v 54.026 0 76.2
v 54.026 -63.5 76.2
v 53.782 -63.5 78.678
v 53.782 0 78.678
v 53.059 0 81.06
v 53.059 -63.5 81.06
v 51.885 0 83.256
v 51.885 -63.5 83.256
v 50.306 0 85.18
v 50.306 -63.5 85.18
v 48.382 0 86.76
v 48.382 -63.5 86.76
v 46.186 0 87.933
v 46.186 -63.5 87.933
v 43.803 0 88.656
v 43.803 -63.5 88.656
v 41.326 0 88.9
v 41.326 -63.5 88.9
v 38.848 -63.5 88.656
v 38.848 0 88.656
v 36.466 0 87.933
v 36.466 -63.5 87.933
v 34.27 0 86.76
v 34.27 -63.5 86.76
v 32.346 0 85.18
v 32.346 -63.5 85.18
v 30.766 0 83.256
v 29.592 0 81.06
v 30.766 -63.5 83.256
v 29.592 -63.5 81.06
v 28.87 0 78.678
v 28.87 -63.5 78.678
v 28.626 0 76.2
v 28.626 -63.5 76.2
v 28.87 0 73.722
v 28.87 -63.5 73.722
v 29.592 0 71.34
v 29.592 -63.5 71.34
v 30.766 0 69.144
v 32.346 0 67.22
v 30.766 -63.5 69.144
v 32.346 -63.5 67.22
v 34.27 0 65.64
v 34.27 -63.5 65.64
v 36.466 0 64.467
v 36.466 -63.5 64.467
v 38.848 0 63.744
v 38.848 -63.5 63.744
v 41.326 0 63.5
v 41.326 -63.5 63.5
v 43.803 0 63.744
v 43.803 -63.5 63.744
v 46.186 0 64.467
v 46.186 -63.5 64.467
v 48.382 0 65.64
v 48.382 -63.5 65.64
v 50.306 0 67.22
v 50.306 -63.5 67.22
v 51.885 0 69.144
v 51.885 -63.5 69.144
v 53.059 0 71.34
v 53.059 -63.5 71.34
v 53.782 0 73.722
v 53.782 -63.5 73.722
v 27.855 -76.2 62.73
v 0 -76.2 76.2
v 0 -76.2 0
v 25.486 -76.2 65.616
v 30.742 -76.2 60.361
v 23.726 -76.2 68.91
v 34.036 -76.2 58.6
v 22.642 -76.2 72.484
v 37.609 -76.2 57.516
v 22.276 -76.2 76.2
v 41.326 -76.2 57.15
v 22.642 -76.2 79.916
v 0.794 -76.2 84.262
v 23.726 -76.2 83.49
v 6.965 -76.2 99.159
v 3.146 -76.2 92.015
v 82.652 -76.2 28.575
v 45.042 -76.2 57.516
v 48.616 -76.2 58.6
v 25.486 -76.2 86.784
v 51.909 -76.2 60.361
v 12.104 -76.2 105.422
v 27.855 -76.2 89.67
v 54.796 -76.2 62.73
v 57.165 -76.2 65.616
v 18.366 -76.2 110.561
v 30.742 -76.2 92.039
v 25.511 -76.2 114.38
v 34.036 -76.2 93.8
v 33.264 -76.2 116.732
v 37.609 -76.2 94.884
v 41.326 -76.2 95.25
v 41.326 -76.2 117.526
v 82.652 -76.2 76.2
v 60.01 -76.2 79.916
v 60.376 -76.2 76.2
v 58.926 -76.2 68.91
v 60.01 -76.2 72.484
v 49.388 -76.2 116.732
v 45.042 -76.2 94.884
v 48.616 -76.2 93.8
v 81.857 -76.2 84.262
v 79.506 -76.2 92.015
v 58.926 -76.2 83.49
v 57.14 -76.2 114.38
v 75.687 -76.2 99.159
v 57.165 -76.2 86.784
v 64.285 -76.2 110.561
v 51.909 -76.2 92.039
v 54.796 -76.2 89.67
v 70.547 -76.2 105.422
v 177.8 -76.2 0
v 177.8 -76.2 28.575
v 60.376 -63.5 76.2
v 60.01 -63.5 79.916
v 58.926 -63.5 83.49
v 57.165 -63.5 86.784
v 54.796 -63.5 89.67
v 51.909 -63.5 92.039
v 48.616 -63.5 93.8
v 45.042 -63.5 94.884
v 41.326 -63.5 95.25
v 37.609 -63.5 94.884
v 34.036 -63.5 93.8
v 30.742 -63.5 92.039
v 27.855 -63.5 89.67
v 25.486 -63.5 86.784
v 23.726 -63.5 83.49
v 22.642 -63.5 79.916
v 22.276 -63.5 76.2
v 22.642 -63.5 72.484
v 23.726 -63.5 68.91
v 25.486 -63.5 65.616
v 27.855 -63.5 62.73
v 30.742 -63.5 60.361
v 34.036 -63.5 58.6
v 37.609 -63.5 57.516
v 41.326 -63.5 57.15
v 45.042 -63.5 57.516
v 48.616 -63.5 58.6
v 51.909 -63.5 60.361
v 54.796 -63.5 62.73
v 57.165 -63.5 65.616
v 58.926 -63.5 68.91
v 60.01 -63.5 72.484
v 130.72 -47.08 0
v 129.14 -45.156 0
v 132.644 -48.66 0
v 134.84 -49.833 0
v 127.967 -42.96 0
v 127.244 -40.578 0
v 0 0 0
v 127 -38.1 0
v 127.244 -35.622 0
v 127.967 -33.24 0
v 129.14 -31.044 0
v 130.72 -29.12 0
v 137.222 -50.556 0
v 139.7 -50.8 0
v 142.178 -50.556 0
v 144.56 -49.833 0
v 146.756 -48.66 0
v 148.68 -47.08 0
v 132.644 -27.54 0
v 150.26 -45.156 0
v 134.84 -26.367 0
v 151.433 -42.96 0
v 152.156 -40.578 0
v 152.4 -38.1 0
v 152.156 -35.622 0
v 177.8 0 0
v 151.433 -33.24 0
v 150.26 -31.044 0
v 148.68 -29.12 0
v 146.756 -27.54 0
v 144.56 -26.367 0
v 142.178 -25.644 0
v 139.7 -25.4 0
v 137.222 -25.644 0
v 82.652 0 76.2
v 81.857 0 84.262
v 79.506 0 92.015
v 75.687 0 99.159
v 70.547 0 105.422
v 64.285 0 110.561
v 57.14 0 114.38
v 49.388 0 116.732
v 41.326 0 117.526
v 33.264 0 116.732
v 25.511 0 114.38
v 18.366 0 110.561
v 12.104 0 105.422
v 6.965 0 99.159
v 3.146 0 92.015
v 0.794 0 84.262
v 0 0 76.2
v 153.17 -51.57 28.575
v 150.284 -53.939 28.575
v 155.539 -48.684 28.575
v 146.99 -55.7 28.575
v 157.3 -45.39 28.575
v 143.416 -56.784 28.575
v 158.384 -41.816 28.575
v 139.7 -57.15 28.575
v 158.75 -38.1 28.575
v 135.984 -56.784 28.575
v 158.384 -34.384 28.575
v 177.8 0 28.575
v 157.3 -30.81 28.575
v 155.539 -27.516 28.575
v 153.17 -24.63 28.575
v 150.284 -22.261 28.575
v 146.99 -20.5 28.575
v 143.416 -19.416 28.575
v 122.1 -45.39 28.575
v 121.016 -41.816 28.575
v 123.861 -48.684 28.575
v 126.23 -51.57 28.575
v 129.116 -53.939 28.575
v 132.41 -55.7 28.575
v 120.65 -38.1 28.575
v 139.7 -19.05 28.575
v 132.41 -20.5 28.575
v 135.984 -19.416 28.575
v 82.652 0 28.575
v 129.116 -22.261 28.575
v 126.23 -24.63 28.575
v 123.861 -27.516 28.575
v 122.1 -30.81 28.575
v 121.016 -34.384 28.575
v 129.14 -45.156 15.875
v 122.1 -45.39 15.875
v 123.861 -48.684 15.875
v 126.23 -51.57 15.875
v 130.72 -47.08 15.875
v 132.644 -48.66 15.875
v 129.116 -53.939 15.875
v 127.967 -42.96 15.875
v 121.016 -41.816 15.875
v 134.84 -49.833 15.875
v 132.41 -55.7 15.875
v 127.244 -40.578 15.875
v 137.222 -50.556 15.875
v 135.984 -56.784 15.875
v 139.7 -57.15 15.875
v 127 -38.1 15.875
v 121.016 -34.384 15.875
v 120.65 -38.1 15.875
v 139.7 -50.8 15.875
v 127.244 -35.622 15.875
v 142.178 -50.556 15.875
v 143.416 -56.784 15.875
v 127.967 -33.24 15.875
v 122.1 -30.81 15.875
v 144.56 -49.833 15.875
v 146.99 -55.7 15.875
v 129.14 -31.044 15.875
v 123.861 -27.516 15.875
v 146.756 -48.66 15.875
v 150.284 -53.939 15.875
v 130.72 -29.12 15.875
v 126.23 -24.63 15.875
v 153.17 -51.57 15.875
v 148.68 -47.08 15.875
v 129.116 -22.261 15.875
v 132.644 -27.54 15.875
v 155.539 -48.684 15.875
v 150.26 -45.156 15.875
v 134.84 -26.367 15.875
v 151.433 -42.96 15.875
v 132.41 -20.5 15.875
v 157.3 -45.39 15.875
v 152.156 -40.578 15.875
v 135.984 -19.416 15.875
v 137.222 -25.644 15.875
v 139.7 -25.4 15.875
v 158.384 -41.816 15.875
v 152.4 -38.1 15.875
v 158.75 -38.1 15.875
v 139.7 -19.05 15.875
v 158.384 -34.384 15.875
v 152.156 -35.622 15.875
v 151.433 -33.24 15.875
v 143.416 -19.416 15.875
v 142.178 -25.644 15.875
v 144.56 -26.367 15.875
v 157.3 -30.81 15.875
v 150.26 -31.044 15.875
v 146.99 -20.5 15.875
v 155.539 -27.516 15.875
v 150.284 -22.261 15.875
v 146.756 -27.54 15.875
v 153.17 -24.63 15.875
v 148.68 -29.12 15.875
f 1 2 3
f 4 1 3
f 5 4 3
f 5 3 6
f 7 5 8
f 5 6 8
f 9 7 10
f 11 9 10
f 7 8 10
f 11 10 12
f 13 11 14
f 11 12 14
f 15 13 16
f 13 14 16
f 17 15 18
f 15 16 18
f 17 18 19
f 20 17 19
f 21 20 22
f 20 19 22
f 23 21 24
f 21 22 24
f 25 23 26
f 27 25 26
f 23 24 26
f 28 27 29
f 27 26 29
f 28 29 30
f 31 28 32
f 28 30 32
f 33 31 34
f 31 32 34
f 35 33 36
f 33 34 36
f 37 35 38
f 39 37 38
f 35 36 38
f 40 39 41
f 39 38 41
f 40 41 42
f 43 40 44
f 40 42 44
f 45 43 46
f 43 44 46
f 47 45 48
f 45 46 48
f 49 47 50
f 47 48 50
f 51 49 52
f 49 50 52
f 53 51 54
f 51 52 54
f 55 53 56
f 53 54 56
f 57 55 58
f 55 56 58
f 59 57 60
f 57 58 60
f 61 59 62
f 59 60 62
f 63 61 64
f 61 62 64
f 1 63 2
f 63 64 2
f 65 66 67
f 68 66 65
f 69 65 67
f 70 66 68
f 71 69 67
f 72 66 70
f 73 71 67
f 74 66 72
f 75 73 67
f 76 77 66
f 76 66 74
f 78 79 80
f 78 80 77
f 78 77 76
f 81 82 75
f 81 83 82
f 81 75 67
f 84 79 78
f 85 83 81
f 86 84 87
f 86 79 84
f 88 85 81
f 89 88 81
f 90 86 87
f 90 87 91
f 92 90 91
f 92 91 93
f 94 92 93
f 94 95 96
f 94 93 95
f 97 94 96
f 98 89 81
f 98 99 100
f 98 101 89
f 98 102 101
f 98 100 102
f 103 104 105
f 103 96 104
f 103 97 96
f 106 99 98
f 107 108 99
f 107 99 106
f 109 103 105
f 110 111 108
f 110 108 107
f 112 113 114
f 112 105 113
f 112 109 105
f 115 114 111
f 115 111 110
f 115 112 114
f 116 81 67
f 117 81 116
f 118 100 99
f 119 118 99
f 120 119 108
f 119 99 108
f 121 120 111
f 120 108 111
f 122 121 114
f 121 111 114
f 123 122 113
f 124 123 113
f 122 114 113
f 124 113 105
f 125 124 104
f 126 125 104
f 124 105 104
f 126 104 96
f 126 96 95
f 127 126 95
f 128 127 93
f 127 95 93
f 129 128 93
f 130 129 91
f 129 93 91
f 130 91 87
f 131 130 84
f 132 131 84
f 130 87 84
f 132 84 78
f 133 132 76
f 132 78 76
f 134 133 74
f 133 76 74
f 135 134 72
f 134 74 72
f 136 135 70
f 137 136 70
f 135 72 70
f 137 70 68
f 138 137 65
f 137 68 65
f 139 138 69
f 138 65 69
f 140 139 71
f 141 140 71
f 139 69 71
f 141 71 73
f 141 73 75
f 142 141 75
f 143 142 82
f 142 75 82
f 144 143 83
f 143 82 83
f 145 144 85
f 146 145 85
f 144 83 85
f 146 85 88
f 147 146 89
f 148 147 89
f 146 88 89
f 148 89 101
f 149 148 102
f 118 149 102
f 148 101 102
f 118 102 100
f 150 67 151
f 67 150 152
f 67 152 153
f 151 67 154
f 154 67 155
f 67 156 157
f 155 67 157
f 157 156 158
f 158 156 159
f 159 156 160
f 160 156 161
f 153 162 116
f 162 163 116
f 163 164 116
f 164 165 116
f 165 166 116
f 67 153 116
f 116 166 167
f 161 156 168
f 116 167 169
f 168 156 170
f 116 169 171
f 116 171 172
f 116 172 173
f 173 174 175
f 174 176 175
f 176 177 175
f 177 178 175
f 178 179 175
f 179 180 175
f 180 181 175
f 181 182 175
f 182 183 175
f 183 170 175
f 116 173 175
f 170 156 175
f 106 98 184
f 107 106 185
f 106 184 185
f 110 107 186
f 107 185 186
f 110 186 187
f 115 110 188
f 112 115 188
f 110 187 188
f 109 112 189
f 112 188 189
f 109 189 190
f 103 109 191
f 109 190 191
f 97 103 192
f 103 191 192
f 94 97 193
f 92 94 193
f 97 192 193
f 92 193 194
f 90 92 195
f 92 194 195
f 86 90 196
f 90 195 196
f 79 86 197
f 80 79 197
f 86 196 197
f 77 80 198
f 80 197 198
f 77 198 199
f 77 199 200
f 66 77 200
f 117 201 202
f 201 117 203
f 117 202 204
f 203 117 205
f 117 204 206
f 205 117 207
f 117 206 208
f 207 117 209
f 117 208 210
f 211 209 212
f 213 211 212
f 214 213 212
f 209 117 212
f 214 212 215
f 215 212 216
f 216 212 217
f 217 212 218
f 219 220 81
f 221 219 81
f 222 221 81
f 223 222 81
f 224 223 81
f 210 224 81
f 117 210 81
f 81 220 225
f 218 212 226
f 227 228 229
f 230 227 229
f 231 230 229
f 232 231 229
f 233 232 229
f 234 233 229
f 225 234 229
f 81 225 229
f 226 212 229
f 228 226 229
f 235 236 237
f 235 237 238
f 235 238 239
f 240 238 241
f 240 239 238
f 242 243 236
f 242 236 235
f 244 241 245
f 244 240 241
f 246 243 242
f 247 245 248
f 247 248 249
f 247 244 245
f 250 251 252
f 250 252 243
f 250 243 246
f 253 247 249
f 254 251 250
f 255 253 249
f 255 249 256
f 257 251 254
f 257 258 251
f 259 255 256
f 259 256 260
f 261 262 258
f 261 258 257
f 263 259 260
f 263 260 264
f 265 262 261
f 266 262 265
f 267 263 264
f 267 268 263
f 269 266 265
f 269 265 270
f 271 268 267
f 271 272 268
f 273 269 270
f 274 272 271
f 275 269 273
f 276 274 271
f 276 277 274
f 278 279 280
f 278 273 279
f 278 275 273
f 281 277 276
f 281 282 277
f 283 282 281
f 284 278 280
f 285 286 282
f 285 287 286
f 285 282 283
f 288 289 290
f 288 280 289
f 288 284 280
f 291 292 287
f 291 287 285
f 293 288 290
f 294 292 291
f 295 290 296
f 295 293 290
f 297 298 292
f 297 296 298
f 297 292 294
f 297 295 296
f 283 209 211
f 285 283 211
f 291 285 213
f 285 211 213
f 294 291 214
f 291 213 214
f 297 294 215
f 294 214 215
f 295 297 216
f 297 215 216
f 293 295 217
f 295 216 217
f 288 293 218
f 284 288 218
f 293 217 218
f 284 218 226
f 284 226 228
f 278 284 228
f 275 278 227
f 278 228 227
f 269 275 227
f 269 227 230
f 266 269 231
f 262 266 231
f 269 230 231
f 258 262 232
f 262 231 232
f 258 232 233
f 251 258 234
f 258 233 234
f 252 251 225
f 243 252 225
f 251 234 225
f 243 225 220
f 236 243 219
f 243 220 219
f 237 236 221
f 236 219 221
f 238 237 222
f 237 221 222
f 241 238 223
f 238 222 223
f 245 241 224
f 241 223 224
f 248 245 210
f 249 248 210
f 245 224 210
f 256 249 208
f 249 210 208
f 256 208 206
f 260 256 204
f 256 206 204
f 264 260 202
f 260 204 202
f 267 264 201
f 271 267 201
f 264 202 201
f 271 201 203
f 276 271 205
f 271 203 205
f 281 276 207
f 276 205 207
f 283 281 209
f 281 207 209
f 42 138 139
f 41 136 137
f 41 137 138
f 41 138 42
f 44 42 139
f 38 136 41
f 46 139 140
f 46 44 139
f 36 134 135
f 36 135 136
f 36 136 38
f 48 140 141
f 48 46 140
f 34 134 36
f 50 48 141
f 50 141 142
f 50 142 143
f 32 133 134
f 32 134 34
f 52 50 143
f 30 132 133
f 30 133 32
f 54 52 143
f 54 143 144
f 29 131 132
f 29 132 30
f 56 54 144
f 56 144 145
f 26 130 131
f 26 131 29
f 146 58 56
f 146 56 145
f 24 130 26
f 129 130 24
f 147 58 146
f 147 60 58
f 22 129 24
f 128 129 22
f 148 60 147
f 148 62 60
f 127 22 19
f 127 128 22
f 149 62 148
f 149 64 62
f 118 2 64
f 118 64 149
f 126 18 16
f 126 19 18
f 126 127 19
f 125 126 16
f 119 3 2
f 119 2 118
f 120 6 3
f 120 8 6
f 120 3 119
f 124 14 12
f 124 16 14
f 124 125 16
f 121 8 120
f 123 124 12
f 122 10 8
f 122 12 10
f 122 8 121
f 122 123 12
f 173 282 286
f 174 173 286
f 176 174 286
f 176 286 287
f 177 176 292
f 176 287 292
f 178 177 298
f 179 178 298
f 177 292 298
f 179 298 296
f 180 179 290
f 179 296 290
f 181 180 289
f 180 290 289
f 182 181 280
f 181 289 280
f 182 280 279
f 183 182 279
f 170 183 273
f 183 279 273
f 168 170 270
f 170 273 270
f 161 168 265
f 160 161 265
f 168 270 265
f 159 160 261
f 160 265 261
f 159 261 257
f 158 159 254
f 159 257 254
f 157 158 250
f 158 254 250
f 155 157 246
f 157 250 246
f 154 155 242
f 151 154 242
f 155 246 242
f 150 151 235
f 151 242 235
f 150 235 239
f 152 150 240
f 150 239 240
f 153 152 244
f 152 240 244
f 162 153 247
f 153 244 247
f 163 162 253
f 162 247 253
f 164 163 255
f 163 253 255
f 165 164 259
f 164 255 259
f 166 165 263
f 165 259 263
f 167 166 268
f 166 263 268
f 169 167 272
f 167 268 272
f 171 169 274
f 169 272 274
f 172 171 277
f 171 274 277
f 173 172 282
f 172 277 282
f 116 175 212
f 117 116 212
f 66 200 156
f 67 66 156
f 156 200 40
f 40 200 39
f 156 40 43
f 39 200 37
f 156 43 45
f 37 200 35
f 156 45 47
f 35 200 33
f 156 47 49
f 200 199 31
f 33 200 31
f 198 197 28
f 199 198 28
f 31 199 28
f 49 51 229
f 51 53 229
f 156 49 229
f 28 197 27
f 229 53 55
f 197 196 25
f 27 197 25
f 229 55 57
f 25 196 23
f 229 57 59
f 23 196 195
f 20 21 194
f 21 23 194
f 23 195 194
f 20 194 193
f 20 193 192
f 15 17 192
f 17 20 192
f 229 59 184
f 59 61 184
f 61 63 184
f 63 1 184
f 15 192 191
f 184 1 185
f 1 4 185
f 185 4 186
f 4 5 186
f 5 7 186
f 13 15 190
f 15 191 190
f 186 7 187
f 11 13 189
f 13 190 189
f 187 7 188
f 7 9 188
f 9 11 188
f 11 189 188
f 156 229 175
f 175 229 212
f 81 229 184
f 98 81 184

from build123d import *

# Parameters (mm, degrees)
F1_DEPTH  = 76.2
F2_R      = 19.05
F3_DEPTH  = 12.7
F4_R      = 12.7
F5_DEPTH  = 12.7
F6_R      = 12.7
F7_DEPTH  = 63.5
F8_R      = 19.05
F9_DEPTH  = 12.7
F10_R     = 12.7
F11_DEPTH = 15.875


with BuildPart() as f1:
    # F0 (on Front) → F1 (new body)
    with BuildSketch(Plane.XZ):
        with BuildLine():
            Line((0, 76.2), (0, 0))
            Line((0, 0), (177.8, 0))
            Line((177.8, 0), (177.8, 28.575))
            Line((177.8, 28.575), (82.651526, 28.575))
            Line((82.651526, 28.575), (82.651526, 76.2))
            ThreePointArc((82.651526, 76.2), (41.325763, 117.525763), (0, 76.2))
        make_face()
    extrude(amount=F1_DEPTH)

    # F2 (on face) → F3 (cut)
    with BuildSketch(Plane.XZ.offset(76.2)):
        with Locations((41.325763, 76.2)):
            Circle(F2_R)
    extrude(amount=-F3_DEPTH, mode=Mode.SUBTRACT)

    # F4 (on face) → F5 (cut, through all)
    with BuildSketch(Plane.XZ.offset(76.2)):
        with Locations((41.325763, 76.2)):
            Circle(F4_R)
    extrude(amount=-F5_DEPTH, mode=Mode.SUBTRACT)

    # F6 (on face) → F7 (cut, through all)
    with BuildSketch(Plane.XZ.offset(63.5)):
        with Locations((41.325763, 76.2)):
            Circle(F6_R)
    extrude(amount=-F7_DEPTH, mode=Mode.SUBTRACT)

    # F8 (on face) → F9 (cut)
    with BuildSketch(Plane.XY.offset(28.575)):
        with Locations((139.7, -38.1)):
            Circle(F8_R)
    extrude(amount=-F9_DEPTH, mode=Mode.SUBTRACT)

    # F10 (on face) → F11 (cut, through all)
    with BuildSketch(Plane.XY.offset(15.875)):
        with Locations((139.7, -38.1)):
            Circle(F10_R)
    extrude(amount=-F11_DEPTH, mode=Mode.SUBTRACT)


solid = f1.part
